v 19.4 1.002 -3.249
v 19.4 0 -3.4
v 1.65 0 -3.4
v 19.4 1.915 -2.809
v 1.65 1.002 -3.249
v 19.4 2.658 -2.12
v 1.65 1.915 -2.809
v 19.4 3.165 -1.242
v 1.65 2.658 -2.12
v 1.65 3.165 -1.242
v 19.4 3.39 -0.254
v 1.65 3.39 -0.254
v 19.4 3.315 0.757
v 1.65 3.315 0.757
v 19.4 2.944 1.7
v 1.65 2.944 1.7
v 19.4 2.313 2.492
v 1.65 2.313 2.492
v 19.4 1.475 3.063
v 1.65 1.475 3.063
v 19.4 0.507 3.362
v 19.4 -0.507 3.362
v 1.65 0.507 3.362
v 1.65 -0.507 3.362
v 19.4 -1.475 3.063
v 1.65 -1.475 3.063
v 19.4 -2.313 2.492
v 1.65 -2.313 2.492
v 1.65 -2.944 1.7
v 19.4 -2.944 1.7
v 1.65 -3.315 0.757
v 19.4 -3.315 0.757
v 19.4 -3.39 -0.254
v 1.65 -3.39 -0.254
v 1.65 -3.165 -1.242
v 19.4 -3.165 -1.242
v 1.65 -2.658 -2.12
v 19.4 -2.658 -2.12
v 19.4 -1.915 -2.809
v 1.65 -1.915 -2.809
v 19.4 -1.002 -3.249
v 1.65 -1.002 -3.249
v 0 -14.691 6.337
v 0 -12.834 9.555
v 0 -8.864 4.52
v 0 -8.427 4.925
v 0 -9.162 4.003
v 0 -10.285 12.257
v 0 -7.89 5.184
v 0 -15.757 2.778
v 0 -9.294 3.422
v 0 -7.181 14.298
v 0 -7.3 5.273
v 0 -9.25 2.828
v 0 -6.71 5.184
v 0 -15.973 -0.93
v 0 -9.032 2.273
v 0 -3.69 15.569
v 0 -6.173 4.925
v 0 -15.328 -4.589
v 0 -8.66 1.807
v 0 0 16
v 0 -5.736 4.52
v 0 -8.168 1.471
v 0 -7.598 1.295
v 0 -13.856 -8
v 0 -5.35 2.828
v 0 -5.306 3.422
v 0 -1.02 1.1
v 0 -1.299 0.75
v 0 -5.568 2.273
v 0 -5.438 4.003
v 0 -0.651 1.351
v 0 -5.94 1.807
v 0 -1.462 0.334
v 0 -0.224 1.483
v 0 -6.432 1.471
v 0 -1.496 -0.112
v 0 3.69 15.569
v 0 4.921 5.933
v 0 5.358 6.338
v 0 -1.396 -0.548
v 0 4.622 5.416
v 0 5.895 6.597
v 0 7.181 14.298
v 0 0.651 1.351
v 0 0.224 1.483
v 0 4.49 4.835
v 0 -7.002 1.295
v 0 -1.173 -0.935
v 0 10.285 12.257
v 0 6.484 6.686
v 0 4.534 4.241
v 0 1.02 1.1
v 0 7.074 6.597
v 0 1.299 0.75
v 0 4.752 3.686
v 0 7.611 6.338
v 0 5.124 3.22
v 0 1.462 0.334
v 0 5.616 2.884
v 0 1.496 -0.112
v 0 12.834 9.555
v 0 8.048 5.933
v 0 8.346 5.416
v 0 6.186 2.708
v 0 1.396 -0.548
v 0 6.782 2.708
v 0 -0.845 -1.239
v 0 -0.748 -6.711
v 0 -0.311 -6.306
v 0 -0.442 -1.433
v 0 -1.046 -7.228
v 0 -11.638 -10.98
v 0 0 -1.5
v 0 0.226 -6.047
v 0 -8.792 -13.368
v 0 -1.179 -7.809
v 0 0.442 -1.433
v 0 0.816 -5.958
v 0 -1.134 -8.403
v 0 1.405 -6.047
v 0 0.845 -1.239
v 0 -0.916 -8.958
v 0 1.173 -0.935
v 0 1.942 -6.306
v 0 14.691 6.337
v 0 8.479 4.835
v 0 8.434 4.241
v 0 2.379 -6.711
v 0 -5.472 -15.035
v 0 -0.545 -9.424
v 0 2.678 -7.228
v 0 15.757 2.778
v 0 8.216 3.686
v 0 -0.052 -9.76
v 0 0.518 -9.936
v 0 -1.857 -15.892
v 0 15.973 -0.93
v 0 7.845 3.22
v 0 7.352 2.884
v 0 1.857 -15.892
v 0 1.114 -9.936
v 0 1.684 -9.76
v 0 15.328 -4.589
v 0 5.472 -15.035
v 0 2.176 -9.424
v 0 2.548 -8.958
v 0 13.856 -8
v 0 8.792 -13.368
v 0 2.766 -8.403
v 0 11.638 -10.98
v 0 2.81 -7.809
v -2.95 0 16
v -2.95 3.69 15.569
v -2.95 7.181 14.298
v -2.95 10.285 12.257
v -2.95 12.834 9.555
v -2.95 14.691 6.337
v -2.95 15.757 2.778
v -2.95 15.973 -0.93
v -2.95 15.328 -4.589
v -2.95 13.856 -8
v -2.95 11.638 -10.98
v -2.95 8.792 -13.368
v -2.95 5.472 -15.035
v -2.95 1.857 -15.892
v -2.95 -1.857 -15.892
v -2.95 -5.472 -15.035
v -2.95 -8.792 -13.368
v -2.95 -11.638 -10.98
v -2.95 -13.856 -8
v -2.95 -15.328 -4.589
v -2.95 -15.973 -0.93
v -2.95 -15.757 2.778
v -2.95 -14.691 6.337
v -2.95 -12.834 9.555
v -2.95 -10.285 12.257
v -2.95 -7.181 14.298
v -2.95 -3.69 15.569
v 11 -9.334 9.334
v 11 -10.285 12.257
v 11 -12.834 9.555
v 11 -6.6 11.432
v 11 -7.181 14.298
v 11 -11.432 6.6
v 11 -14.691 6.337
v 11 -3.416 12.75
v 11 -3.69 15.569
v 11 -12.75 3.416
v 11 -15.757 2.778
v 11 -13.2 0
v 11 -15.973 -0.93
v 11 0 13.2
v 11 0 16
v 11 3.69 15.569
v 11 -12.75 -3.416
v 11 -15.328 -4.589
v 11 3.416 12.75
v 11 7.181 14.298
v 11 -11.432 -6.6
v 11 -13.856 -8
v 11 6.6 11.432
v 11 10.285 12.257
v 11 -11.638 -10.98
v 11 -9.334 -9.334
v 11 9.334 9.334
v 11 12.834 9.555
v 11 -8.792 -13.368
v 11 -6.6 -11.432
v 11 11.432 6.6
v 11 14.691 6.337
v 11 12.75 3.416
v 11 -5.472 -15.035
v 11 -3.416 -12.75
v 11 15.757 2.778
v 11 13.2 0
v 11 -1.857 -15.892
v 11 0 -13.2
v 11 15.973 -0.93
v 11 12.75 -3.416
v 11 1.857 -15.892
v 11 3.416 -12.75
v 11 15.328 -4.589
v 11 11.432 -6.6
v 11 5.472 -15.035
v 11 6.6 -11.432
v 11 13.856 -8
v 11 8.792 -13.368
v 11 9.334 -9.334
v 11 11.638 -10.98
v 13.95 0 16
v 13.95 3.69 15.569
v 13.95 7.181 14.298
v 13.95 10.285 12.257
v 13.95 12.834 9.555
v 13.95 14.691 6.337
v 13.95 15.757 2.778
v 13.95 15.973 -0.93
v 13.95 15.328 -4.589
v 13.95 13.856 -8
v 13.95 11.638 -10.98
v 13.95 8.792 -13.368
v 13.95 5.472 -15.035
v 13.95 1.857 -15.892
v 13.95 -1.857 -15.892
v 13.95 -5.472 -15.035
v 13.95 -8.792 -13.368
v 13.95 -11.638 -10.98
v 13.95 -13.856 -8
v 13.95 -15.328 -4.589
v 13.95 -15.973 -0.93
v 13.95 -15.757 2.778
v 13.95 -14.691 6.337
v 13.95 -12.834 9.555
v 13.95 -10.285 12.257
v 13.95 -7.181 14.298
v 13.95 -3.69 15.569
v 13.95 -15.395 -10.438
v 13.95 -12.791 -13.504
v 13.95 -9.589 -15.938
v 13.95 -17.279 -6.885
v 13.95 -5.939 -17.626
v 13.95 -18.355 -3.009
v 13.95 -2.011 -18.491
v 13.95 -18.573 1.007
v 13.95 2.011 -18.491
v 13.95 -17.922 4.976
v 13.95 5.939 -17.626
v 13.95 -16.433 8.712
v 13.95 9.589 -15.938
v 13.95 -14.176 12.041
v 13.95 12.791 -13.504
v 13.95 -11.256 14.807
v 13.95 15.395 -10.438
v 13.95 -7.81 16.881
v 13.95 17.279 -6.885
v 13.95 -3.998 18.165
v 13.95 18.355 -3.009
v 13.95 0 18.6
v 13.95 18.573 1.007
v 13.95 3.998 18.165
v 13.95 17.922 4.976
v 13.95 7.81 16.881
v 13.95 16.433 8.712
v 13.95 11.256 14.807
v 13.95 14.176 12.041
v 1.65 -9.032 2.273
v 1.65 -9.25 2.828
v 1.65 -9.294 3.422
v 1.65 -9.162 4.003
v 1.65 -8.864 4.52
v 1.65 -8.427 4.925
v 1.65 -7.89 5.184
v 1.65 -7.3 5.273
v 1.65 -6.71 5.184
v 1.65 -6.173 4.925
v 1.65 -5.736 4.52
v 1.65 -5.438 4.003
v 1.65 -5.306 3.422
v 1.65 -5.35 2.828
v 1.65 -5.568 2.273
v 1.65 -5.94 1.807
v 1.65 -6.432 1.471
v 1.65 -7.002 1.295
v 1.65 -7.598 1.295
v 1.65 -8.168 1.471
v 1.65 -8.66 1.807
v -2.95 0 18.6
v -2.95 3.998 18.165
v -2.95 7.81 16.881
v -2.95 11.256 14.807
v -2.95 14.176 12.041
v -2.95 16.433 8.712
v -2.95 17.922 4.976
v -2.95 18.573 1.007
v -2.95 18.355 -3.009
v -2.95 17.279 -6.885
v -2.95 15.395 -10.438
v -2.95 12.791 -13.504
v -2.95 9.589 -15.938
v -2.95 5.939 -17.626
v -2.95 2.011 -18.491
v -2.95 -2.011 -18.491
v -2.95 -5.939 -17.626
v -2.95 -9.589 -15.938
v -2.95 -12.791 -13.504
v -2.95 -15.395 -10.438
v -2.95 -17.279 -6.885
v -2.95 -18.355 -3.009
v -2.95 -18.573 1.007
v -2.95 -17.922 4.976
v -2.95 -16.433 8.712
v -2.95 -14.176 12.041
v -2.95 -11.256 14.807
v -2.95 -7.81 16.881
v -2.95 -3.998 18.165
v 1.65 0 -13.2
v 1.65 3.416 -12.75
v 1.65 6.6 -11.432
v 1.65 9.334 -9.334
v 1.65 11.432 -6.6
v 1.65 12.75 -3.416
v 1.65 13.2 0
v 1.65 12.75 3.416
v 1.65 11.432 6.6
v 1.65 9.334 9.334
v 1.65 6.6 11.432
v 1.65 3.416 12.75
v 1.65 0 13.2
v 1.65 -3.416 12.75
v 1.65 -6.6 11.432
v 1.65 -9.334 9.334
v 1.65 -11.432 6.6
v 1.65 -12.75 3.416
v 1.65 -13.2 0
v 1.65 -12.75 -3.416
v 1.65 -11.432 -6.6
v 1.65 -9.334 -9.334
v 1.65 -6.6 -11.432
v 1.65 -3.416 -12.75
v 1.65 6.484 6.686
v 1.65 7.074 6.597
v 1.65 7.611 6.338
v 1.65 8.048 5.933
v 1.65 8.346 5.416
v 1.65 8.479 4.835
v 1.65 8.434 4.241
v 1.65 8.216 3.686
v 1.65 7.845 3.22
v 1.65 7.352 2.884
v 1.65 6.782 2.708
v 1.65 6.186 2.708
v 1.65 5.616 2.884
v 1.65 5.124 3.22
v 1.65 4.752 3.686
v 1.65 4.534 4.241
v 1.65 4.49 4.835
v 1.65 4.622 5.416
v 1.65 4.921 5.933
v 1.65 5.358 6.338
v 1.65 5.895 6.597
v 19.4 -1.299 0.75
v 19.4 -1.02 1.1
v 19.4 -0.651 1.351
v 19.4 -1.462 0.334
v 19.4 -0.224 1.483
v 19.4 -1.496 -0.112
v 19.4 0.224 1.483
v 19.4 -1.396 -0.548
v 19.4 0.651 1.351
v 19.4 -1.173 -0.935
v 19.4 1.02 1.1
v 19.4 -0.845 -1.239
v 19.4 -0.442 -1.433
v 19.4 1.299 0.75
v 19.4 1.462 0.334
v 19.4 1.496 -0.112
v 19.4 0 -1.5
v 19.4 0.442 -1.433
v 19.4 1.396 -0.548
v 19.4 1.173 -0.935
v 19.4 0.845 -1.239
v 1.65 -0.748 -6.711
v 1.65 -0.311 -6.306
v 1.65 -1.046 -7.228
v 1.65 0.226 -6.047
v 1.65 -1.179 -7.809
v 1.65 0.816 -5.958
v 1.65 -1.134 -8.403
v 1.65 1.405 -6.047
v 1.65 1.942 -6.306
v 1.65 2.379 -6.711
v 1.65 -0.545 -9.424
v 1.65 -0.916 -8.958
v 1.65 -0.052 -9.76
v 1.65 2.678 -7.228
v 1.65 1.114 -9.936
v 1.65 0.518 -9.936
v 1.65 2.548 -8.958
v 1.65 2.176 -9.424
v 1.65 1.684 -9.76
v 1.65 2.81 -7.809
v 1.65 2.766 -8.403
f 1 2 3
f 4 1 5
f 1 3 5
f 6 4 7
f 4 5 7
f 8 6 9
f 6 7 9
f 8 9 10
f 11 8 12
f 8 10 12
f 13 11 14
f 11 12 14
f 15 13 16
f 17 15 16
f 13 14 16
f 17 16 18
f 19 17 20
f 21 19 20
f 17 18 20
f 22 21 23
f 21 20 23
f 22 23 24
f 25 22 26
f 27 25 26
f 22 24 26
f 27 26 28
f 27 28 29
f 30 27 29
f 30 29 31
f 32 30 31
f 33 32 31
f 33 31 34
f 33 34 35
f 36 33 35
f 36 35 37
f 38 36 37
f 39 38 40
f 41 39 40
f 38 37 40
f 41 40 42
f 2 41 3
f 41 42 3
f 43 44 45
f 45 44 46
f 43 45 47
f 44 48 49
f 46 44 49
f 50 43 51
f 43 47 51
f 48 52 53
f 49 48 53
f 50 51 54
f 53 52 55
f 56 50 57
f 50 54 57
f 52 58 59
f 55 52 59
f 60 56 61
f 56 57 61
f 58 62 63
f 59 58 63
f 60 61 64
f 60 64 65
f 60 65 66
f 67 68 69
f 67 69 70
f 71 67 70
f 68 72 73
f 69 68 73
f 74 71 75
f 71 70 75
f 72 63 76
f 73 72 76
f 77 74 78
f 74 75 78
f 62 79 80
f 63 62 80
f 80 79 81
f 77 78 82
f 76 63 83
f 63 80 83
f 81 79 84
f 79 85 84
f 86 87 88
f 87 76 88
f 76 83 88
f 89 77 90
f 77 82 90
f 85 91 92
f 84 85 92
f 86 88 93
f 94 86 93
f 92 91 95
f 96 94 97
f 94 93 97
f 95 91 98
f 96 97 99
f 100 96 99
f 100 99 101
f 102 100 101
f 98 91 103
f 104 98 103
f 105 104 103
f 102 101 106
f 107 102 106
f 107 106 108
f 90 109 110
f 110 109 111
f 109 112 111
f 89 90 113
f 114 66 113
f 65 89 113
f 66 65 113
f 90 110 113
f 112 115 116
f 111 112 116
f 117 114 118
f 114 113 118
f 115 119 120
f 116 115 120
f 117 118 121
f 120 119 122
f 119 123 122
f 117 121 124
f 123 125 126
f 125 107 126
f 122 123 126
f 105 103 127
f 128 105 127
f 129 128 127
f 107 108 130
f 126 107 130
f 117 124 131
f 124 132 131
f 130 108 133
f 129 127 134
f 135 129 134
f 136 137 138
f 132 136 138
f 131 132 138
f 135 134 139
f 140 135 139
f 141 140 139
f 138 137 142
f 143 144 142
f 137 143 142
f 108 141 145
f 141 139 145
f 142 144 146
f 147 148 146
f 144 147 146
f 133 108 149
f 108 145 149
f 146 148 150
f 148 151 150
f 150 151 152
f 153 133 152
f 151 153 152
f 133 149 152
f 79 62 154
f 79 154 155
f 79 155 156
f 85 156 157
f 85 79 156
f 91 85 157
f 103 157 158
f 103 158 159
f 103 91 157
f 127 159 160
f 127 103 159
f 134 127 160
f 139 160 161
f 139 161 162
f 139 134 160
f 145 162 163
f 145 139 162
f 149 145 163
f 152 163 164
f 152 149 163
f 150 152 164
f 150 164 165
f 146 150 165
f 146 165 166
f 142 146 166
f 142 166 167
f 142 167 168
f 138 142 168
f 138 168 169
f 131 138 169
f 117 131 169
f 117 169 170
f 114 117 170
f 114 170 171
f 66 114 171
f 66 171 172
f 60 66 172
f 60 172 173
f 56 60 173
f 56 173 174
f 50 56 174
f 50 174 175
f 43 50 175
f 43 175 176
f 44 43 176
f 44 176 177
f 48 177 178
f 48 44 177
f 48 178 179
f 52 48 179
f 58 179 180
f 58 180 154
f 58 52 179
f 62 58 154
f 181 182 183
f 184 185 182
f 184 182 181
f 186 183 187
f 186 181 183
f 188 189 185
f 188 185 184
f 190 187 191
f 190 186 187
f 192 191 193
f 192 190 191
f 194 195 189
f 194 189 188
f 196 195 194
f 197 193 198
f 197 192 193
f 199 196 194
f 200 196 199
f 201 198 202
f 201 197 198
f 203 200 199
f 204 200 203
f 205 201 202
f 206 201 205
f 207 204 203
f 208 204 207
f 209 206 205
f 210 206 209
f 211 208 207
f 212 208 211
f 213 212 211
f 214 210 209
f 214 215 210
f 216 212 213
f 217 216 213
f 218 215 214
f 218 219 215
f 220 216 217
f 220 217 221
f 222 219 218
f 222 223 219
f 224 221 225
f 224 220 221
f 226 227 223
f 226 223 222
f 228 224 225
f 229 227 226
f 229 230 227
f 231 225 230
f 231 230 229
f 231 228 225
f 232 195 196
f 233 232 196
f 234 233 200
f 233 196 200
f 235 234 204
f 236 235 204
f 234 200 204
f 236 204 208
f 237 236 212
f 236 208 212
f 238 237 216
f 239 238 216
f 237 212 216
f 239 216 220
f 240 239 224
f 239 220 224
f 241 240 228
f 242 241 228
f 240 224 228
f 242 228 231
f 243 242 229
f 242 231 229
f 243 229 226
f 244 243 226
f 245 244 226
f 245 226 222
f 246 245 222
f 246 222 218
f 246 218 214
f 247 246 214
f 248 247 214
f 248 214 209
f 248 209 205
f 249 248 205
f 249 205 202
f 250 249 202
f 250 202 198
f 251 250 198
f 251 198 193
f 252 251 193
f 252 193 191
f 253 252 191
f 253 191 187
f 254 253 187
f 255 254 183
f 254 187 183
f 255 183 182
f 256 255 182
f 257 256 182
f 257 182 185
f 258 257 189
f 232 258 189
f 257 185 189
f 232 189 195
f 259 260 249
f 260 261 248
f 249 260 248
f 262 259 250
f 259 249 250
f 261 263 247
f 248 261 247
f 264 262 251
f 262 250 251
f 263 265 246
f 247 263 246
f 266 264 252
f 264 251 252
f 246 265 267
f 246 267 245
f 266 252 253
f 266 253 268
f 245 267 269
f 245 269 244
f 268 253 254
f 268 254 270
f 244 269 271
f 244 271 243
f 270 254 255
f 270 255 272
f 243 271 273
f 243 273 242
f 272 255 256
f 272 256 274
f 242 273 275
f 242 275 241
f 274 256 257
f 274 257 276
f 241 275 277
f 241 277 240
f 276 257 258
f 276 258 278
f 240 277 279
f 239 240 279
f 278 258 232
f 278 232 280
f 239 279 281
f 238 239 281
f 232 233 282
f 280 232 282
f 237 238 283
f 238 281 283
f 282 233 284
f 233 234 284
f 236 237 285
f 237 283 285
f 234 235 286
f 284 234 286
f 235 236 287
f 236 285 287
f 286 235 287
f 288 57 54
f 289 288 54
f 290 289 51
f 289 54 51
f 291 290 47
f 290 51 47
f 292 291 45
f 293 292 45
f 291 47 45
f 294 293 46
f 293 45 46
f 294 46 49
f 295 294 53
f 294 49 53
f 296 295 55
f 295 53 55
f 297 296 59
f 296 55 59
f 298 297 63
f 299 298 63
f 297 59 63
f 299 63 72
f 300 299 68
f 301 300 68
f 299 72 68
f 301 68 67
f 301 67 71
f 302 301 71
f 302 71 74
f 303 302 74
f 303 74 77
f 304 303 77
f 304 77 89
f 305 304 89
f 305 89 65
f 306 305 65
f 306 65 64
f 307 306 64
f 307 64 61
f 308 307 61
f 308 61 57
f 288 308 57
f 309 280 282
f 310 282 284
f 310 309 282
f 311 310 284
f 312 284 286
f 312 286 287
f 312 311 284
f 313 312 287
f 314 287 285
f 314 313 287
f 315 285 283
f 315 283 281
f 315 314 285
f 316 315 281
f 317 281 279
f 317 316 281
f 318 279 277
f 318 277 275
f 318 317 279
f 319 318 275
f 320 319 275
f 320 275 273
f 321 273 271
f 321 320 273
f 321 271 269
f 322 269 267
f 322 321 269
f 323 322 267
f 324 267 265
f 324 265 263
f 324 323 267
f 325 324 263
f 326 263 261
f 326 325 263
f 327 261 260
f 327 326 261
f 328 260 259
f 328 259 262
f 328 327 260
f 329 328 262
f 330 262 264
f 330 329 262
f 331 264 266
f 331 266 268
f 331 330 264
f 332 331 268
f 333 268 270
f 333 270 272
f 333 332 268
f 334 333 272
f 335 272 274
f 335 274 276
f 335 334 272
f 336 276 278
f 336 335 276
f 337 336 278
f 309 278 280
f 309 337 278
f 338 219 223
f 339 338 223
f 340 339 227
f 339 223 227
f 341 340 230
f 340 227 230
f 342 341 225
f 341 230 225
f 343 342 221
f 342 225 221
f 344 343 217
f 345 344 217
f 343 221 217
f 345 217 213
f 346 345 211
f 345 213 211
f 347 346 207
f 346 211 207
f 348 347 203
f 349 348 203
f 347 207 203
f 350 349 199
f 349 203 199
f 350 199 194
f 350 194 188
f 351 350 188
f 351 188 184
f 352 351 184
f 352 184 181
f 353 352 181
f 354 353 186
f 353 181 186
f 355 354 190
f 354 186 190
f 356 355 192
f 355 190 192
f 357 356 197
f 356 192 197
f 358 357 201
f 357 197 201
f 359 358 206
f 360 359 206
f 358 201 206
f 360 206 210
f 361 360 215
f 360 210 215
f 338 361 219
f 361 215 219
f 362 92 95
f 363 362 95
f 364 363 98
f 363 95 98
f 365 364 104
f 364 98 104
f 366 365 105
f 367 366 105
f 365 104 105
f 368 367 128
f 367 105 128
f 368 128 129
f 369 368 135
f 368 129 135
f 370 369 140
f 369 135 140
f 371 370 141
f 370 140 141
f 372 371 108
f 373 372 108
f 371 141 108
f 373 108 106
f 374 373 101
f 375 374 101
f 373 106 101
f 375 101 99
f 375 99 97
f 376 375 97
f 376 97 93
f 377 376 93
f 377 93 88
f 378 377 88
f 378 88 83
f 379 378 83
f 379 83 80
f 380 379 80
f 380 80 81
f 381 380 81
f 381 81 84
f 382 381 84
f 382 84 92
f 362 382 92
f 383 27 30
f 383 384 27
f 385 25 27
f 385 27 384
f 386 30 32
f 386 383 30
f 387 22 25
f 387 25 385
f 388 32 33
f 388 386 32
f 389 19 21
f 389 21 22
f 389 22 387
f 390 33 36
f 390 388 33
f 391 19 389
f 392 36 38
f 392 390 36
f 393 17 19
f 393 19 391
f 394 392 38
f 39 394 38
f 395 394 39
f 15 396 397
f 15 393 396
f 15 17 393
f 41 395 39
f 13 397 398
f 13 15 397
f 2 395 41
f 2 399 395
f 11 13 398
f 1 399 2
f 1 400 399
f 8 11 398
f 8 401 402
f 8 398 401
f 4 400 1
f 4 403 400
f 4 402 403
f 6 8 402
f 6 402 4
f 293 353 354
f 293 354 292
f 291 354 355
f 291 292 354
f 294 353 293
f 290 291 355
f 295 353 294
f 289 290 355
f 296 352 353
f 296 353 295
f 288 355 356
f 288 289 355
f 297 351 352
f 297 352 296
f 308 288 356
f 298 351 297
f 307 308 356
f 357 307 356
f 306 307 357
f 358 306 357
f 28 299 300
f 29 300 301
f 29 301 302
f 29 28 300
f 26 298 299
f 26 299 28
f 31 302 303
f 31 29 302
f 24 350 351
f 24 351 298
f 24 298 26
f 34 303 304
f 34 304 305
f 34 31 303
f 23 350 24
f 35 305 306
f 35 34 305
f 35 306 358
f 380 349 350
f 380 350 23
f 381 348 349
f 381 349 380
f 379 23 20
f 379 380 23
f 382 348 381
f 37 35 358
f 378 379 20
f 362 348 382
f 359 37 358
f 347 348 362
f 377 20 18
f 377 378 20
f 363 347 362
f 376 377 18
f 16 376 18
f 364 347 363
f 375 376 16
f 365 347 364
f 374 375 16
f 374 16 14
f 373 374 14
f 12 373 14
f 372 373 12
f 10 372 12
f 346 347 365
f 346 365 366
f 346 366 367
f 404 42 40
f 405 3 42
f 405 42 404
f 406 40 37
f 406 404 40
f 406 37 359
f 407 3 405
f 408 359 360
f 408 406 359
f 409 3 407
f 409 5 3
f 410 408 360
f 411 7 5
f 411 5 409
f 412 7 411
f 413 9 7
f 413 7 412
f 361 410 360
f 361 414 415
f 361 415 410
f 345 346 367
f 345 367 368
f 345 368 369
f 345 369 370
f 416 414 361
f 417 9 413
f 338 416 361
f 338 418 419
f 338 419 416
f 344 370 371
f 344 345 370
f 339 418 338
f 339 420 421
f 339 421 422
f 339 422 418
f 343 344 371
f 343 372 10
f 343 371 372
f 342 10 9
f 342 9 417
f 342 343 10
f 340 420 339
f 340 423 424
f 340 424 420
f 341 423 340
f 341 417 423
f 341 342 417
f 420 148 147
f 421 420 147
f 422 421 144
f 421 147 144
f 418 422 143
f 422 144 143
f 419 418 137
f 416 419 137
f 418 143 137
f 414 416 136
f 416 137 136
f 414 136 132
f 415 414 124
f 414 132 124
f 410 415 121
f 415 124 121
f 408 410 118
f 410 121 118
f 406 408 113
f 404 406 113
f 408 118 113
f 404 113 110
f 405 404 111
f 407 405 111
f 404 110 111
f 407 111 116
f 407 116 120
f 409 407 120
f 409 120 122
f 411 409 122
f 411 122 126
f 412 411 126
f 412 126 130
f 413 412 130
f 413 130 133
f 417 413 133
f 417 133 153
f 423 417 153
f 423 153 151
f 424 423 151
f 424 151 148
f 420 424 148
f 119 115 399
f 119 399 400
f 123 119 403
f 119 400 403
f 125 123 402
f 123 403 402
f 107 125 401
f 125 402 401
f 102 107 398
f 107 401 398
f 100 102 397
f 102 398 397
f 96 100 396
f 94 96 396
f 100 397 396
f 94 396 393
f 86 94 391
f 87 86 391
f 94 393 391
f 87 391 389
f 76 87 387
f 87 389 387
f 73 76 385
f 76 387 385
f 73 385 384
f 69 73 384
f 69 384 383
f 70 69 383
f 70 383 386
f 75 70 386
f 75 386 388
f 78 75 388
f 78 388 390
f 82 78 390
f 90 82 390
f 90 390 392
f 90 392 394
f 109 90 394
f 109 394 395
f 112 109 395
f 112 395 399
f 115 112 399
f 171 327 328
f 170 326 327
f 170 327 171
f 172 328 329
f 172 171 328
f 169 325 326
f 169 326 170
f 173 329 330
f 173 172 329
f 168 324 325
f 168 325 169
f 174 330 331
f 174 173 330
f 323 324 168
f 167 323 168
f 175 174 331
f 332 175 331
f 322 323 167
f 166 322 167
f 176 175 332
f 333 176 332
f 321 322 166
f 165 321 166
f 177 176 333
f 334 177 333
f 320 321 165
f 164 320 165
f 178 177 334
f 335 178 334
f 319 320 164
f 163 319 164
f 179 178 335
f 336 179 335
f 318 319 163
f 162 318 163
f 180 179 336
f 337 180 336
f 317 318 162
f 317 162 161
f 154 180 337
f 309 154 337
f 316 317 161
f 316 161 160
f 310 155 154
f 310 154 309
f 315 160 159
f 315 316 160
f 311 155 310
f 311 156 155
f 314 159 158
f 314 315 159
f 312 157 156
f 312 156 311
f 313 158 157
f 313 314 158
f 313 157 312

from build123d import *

# Parameters (mm, degrees)
SKETCH_1_R               = 16
EXTRUDE_1_DEPTH          = 11
SKETCH_2_R               = 13.2
CUT_EXTRUDE_1_DEPTH      = 9.35
SKETCH_3_R               = 2
CUT_EXTRUDE_3_DEPTH      = 9.35
PATTERN_CIRCULAR_3_COUNT = 3
SKETCH_4_R               = 3.4
EXTRUDE_2_DEPTH          = 17.75
SKETCH_5_R               = 1.5
CUT_EXTRUDE_4_DEPTH      = 25.75
SKETCH_6_R               = 18.6
SKETCH_6_R_2             = 16
EXTRUDE_4_DEPTH          = 2.95
EXTRUDE_4_DEPTH_BACK     = 13.95


with BuildPart() as part:
    # ｽｹｯﾁ1 → ﾎﾞｽ - 押し出し1 (new body)
    with BuildSketch(Plane(origin=(0, 0, 0), x_dir=(0, 0, -1), z_dir=(1, 0, 0))):
        Circle(SKETCH_1_R)
    extrude(amount=EXTRUDE_1_DEPTH)

    # ｽｹｯﾁ2 → ｶｯﾄ - 押し出し1 (cut)
    with BuildSketch(Plane(origin=(11, 0, 0), x_dir=(0, 0, -1), z_dir=(1, 0, 0))):
        Circle(SKETCH_2_R)
    extrude(amount=-CUT_EXTRUDE_1_DEPTH, mode=Mode.SUBTRACT)

    # ｽｹｯﾁ3 → ｶｯﾄ - 押し出し3 (cut)
    with BuildSketch(Plane.ZY):
        with Locations((4.685675375, 6.484168897)):
            Circle(SKETCH_3_R)
    cut_extrude_3 = extrude(amount=-CUT_EXTRUDE_3_DEPTH, mode=Mode.SUBTRACT)

    # 円形ﾊﾟﾀｰﾝ3: ｶｯﾄ - 押し出し3 ×3 about axis
    pattern_circular_3_axis = Axis((0, 0, 0), (1, 0, 0))
    for i in range(1, PATTERN_CIRCULAR_3_COUNT):
        add(cut_extrude_3.rotate(pattern_circular_3_axis, i * 360 / PATTERN_CIRCULAR_3_COUNT), mode=Mode.SUBTRACT)

    # ｽｹｯﾁ4 → ﾎﾞｽ - 押し出し2 (add)
    with BuildSketch(Plane(origin=(1.65, 0, 0), x_dir=(0, 0, -1), z_dir=(1, 0, 0))):
        Circle(SKETCH_4_R)
    extrude(amount=EXTRUDE_2_DEPTH)

    # ｽｹｯﾁ5 → ｶｯﾄ - 押し出し4 (cut)
    with BuildSketch(Plane(origin=(19.4, 0, 0), x_dir=(0, 0, -1), z_dir=(1, 0, 0))):
        Circle(SKETCH_5_R)
    extrude(amount=-CUT_EXTRUDE_4_DEPTH, mode=Mode.SUBTRACT)

    # ｽｹｯﾁ6 → ﾎﾞｽ - 押し出し4 (add, two sides)
    with BuildSketch(Plane.ZY) as extrude_4_sk:
        Circle(SKETCH_6_R)
        Circle(SKETCH_6_R_2, mode=Mode.SUBTRACT)
    extrude(amount=EXTRUDE_4_DEPTH)
    extrude(extrude_4_sk.sketch, amount=-EXTRUDE_4_DEPTH_BACK)


solid = part.part
